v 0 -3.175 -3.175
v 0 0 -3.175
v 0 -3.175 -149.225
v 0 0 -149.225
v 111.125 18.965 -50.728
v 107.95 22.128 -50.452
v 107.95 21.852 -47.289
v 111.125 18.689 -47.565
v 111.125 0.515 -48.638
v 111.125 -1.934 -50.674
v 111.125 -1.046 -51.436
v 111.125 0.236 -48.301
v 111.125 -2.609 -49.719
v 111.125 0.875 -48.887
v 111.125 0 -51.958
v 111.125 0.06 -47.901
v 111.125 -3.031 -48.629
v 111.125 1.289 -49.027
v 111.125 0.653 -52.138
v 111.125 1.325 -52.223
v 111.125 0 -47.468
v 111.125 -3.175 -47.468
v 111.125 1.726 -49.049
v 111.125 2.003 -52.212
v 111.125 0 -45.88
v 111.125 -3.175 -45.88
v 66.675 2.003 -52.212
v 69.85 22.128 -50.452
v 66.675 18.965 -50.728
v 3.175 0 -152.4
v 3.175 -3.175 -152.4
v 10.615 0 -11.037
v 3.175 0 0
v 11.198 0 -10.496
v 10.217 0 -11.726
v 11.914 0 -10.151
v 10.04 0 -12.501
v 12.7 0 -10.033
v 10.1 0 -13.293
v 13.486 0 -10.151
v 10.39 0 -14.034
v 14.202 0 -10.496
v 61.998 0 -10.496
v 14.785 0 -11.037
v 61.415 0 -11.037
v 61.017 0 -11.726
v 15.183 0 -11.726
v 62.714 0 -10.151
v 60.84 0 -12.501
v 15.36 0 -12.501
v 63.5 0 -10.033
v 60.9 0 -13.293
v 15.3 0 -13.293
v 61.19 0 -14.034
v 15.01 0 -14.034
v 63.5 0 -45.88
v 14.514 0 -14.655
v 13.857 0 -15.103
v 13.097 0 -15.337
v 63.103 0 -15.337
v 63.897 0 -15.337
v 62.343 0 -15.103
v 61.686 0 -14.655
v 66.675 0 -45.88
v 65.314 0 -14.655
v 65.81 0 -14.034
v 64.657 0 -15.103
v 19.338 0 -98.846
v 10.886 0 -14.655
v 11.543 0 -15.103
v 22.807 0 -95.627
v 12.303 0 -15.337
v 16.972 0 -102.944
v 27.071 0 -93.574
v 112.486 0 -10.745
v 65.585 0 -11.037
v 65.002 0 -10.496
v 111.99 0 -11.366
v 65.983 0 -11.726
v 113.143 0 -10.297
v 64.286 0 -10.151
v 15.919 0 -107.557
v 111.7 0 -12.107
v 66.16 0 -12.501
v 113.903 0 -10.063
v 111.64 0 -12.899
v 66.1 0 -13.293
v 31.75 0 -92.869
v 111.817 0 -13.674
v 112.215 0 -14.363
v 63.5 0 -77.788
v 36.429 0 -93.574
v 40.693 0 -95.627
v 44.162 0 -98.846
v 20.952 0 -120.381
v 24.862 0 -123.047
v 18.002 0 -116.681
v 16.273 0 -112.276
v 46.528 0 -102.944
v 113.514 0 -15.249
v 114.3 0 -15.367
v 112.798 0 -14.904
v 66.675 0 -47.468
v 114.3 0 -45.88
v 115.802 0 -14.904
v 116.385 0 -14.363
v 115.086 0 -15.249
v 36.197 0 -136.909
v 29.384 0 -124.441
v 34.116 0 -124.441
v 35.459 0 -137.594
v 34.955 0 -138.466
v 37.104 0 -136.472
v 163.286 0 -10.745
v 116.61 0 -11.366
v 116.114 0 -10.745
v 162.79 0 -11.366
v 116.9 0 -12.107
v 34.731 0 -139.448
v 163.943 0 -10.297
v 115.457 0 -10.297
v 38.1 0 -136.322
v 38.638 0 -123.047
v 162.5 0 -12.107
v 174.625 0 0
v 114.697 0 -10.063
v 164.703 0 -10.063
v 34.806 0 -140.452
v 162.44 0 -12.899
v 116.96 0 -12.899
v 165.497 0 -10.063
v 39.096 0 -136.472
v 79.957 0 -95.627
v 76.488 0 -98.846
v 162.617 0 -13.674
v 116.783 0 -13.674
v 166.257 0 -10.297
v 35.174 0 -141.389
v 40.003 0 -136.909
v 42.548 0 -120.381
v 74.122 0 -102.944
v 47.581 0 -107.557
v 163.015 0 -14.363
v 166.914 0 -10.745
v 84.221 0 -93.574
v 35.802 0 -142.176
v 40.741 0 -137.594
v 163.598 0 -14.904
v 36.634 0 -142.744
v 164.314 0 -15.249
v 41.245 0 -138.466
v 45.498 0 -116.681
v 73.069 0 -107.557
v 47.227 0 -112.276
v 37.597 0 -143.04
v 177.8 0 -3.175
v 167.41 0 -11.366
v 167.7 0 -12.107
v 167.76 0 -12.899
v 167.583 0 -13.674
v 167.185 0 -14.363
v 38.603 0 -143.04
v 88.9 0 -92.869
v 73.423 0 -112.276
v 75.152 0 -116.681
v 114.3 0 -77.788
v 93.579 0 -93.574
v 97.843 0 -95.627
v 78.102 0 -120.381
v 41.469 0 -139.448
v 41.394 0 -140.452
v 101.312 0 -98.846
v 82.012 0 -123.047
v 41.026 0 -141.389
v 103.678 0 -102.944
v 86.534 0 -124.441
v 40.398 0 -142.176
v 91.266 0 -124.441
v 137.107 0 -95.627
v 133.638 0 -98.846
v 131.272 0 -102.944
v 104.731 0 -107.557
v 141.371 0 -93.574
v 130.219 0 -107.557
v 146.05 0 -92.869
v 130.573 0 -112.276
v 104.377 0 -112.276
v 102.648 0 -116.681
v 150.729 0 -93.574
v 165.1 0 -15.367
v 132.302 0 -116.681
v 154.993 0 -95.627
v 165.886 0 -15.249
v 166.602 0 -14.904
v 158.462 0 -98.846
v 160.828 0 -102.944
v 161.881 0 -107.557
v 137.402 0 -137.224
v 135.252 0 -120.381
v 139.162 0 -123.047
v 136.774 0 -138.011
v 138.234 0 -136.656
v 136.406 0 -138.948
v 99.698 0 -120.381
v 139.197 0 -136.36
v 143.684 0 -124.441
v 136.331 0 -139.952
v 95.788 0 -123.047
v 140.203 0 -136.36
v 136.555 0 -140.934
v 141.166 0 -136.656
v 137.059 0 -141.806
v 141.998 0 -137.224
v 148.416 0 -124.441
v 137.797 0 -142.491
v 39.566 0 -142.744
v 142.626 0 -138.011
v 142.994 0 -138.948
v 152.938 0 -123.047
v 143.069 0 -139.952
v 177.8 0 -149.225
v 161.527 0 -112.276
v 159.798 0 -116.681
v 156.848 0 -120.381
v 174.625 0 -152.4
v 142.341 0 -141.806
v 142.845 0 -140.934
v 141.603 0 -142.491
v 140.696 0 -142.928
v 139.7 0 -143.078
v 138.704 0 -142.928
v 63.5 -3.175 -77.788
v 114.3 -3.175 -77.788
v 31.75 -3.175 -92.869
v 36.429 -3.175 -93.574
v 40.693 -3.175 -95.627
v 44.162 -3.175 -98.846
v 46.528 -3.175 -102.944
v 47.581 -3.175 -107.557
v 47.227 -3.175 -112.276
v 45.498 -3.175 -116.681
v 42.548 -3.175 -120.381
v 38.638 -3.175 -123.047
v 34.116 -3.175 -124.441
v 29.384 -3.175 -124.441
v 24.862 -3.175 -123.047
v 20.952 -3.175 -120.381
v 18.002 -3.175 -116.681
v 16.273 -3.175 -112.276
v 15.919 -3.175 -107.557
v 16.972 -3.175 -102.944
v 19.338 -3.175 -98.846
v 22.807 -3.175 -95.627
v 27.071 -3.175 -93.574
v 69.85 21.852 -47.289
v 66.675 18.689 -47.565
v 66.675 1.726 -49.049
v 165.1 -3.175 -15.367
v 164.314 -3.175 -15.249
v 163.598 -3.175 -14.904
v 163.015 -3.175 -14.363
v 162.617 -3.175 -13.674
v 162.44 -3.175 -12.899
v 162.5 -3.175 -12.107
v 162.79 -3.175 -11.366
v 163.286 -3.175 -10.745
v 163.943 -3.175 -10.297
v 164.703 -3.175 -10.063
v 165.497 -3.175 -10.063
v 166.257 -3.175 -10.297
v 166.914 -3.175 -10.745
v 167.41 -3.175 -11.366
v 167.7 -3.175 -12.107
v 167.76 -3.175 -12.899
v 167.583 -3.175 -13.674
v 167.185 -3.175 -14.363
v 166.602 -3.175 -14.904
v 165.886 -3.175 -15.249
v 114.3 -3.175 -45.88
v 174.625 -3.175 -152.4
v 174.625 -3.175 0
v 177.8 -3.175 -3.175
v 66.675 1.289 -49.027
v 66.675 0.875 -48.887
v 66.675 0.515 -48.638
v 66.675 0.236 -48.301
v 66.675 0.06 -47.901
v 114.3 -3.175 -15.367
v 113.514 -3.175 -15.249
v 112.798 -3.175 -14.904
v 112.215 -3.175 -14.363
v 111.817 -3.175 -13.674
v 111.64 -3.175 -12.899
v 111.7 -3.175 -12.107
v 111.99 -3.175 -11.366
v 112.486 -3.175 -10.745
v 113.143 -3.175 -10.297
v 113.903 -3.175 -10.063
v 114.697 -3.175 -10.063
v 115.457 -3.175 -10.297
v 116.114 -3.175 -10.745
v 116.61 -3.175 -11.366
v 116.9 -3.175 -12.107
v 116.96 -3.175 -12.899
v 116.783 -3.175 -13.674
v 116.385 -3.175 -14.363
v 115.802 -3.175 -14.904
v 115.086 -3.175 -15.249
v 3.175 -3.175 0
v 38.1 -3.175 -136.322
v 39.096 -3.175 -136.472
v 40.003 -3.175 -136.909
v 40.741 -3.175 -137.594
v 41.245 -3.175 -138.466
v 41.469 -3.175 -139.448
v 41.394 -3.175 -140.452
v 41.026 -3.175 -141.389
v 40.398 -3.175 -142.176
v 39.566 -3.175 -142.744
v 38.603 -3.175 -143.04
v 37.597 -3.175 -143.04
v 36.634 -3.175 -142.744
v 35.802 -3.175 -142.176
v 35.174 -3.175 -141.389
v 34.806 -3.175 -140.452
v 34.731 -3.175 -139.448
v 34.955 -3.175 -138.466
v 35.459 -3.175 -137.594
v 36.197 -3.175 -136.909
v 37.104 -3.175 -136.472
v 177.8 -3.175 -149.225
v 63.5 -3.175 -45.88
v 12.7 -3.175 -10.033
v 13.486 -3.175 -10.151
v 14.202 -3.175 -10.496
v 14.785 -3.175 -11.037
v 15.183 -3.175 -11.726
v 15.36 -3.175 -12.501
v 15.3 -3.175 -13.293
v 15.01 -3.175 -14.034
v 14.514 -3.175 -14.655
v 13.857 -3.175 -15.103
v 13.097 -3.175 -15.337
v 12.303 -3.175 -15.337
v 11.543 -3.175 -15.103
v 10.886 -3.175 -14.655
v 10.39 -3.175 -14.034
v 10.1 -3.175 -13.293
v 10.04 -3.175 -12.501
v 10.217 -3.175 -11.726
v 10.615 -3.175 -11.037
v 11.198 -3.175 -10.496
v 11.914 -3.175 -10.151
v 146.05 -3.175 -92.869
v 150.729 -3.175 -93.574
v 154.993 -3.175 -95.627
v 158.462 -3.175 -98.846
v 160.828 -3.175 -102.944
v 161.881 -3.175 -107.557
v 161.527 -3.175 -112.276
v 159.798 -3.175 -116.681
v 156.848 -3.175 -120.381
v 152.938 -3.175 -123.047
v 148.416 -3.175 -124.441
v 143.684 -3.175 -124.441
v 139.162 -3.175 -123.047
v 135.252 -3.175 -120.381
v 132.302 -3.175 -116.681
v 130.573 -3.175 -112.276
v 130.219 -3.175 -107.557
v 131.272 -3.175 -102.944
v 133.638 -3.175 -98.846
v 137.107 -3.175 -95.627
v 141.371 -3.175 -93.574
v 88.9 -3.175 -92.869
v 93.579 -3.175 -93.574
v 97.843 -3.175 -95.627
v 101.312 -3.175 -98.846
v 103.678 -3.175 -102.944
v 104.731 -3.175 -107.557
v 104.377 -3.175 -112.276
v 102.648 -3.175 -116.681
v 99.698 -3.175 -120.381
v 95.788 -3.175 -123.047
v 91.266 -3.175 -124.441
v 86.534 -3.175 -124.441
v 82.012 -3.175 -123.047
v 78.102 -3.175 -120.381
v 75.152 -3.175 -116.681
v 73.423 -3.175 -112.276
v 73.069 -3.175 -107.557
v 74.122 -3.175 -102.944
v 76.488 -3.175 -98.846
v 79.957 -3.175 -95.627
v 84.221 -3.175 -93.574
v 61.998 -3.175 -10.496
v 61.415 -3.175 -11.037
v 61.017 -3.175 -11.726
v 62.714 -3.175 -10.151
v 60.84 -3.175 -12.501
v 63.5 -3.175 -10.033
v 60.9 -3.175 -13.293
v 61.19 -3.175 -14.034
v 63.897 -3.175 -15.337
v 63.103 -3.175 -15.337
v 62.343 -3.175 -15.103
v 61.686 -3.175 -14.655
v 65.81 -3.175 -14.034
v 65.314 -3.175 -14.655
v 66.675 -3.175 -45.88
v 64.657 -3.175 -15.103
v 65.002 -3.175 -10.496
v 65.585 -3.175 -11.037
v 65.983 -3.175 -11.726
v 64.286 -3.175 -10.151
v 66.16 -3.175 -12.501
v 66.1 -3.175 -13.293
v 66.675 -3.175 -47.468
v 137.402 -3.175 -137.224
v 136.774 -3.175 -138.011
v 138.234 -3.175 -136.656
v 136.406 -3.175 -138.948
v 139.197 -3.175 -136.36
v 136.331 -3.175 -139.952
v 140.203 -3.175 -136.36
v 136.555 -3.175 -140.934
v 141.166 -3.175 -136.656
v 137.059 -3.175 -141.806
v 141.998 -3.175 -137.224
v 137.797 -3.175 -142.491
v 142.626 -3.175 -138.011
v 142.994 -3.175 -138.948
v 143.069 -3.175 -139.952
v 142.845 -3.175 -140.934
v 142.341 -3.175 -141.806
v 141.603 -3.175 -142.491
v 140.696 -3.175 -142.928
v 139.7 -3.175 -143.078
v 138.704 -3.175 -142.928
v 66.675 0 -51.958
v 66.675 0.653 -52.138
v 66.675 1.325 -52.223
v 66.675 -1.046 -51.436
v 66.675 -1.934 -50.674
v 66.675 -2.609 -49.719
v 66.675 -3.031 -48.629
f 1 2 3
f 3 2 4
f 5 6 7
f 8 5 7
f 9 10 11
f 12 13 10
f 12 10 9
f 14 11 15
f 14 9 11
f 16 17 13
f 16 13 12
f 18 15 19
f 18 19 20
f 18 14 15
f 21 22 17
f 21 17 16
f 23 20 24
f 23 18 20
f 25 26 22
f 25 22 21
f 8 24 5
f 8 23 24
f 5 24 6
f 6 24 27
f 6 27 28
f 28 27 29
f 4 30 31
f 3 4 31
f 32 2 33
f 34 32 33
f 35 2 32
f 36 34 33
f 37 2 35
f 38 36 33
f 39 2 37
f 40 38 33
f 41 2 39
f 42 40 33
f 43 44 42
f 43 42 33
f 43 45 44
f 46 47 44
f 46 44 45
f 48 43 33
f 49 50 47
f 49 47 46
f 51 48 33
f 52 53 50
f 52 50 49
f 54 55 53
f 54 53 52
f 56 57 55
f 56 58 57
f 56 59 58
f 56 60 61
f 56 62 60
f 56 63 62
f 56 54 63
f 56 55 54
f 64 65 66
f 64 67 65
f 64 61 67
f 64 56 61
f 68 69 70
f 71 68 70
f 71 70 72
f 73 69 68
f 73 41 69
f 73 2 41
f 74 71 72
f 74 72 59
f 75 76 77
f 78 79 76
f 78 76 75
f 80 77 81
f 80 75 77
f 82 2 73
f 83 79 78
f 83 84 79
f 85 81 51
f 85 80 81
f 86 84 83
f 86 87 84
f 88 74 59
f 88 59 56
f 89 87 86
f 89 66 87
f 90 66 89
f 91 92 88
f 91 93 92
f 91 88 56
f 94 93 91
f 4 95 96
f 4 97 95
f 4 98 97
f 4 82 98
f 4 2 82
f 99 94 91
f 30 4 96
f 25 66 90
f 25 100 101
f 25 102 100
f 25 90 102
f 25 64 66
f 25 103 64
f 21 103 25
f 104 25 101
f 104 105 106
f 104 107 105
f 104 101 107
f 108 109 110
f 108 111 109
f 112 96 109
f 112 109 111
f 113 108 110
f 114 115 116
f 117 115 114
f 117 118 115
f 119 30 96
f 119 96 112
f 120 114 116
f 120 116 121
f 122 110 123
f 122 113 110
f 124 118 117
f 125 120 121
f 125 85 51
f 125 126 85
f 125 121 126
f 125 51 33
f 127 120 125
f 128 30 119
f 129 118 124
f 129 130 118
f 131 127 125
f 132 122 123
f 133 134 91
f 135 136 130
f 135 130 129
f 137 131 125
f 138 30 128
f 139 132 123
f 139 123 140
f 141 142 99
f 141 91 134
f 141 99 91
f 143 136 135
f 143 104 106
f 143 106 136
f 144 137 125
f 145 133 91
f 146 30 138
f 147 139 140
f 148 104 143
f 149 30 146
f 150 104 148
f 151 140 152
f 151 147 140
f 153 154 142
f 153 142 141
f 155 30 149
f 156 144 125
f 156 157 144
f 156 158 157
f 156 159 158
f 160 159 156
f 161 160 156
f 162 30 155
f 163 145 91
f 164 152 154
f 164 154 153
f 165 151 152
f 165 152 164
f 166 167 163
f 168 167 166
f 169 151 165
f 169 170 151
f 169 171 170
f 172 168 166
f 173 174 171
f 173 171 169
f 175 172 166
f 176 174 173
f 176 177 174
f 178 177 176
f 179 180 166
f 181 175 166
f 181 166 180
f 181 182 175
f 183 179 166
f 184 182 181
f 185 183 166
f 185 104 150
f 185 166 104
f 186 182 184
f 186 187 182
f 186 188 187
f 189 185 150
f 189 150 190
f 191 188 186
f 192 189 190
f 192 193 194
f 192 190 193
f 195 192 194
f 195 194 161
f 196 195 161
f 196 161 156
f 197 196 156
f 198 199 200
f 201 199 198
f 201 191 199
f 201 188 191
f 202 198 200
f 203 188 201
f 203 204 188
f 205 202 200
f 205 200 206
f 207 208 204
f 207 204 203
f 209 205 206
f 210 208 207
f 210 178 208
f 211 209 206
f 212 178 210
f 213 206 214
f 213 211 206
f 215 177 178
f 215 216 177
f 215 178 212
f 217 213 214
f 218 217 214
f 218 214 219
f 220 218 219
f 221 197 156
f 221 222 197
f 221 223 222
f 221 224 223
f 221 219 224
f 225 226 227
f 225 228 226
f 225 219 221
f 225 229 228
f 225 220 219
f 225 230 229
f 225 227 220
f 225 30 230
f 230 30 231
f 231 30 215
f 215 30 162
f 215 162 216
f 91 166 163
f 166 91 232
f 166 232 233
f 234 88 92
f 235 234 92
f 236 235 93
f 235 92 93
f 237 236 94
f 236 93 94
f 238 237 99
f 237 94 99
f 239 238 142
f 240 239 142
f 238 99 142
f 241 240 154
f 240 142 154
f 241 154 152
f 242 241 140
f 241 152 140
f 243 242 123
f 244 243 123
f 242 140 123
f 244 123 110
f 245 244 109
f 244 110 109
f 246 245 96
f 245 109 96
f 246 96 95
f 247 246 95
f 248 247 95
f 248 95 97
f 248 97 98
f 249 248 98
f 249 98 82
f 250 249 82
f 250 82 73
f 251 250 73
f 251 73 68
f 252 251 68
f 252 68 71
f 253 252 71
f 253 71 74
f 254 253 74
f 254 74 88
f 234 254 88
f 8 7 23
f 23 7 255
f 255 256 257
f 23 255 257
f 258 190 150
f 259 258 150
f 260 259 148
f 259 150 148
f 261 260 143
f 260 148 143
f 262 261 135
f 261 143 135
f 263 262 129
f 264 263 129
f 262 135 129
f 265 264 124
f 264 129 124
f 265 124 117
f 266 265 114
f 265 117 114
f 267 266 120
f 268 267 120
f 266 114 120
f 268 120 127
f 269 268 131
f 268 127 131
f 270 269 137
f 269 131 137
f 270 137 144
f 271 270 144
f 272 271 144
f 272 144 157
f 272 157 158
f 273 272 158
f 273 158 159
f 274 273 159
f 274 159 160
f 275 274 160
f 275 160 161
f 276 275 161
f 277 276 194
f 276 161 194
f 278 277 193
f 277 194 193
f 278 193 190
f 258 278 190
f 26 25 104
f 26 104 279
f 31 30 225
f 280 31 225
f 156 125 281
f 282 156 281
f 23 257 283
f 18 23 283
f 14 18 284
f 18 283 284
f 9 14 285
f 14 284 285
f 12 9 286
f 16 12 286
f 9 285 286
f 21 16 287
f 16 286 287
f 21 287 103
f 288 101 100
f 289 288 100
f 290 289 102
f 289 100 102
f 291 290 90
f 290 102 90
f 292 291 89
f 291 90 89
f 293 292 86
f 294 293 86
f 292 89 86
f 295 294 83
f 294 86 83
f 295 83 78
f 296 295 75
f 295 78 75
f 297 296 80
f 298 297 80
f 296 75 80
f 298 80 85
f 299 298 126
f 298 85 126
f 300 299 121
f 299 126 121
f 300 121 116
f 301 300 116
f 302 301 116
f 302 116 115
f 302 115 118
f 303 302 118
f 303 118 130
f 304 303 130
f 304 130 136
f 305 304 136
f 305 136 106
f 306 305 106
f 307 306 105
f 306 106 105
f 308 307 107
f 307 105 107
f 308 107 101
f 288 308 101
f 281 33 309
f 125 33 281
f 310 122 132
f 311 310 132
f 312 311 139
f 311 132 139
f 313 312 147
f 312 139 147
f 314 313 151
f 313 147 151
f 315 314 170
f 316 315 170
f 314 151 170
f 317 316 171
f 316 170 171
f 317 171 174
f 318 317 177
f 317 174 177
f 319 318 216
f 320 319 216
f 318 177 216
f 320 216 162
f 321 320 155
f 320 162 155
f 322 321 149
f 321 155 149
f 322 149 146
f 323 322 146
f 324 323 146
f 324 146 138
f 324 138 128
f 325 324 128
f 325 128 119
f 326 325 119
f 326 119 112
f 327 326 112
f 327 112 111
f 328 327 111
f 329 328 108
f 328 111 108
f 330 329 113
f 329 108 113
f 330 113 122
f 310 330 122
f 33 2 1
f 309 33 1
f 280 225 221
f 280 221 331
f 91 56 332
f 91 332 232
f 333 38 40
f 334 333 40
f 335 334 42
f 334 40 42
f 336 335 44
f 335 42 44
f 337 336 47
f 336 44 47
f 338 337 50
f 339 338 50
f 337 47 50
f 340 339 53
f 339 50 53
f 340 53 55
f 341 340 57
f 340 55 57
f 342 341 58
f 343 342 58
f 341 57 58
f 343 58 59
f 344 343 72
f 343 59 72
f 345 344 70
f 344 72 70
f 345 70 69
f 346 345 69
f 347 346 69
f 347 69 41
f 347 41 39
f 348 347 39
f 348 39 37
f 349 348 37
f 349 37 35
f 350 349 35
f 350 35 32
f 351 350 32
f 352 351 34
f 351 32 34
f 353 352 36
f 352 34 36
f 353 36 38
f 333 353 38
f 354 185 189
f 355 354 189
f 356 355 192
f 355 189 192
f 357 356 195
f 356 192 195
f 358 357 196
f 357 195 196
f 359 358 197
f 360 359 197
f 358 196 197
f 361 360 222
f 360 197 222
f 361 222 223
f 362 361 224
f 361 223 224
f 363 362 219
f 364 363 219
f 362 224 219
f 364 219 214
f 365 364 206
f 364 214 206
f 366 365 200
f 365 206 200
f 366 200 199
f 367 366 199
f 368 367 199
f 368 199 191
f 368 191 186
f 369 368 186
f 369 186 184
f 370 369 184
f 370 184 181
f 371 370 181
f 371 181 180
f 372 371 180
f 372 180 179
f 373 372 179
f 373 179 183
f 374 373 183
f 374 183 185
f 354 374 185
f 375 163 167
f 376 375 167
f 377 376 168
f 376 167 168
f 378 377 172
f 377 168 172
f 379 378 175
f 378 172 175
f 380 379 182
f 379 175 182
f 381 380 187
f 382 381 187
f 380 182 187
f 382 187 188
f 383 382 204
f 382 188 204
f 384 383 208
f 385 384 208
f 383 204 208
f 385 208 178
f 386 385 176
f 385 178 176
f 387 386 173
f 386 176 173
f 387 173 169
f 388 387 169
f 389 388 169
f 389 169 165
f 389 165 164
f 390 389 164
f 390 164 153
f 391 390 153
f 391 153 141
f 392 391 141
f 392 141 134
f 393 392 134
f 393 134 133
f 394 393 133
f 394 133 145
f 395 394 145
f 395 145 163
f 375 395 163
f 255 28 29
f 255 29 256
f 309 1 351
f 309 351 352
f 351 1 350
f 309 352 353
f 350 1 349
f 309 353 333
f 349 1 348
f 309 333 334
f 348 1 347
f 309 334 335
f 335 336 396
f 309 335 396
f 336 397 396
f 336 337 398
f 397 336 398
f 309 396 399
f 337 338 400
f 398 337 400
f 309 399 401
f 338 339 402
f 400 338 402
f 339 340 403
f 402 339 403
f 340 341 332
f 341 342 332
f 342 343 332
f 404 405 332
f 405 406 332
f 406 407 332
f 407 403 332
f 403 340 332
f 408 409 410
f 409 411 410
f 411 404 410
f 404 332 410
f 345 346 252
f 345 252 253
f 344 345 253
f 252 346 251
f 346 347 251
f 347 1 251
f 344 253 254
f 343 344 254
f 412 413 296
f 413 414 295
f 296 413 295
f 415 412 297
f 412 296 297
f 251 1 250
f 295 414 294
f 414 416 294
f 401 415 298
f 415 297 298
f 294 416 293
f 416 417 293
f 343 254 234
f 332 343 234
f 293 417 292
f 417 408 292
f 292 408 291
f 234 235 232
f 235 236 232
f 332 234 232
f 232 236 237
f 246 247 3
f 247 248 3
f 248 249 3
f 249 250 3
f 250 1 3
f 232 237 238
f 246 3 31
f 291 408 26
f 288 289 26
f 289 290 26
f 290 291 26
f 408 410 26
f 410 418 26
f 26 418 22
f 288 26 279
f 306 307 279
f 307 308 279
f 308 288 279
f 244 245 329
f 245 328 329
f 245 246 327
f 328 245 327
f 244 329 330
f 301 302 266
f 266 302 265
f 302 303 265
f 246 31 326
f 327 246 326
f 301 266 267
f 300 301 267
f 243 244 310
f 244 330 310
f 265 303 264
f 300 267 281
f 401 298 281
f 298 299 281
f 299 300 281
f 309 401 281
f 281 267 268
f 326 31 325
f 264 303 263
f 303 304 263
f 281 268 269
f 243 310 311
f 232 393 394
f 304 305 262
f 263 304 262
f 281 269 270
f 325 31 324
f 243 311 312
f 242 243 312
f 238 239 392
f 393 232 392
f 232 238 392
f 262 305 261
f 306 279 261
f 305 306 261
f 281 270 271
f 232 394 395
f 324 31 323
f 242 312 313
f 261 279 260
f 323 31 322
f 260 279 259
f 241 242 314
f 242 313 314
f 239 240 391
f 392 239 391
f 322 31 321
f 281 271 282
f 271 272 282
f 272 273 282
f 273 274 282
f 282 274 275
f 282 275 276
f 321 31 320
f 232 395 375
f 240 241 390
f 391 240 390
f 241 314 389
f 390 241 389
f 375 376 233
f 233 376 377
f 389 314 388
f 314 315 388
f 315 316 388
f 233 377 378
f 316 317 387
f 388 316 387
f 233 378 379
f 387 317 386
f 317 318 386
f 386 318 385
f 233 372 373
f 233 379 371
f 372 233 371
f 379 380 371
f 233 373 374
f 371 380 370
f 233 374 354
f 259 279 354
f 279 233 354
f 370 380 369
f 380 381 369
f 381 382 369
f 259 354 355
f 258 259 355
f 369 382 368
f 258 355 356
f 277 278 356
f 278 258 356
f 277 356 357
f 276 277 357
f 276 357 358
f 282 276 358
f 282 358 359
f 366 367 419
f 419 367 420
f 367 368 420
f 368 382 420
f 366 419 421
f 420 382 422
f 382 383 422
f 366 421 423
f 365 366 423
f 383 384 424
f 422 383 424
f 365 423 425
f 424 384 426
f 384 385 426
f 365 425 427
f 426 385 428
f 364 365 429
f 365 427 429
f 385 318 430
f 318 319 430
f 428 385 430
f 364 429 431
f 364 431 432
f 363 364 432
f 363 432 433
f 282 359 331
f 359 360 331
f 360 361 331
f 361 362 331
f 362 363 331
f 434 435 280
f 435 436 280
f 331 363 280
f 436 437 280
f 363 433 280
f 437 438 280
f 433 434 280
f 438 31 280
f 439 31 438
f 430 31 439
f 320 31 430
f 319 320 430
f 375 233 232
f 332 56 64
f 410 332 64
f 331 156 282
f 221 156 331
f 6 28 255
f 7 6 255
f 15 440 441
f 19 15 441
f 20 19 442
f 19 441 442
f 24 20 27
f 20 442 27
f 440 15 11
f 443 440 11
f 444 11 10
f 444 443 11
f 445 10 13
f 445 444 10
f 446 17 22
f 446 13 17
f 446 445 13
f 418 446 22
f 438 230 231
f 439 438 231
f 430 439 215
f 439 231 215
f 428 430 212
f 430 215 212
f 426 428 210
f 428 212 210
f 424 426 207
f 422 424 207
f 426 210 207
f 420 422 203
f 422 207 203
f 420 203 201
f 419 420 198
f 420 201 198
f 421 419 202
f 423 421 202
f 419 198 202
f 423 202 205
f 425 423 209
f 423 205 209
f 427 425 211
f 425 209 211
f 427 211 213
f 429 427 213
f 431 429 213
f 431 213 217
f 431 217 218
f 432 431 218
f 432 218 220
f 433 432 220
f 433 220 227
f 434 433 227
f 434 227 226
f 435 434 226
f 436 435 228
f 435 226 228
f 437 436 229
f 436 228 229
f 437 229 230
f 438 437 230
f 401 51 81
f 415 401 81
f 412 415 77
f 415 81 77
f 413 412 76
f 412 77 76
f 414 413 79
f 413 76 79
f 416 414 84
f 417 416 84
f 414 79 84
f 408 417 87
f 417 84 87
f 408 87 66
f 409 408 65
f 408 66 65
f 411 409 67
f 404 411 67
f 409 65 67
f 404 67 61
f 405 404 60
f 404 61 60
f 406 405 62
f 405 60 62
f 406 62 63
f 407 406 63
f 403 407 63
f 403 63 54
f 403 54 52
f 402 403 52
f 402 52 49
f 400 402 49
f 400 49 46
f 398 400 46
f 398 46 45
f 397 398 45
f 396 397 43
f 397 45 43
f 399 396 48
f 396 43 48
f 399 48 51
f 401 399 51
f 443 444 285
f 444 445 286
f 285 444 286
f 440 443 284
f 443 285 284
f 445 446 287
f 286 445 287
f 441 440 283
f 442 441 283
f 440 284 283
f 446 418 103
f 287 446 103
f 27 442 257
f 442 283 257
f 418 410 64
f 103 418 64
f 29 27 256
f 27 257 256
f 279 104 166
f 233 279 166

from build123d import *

# Parameters (mm, degrees)
SKETCH1_W            = 177.8
SKETCH1_H            = 152.4
SKETCH1_R            = 3.3782
SKETCH1_R_2          = 2.667
BASE_FLANGE1_DEPTH   = 3.175
CHAMFER2_SIZE        = 3.175
SKETCH7_W            = 50.8
SKETCH7_H            = 25.4
CUT_EXTRUDE2_DEPTH   = 235.197951795
EDGE_FLANGE1_START   = 65.0875
EDGE_FLANGE1_DEPTH   = 47.625
EDGE_FLANGE1_2_DEPTH = 1.5875
EDGE_FLANGE1_START_2 = 111.125
EDGE_FLANGE1_3_DEPTH = 1.5875
EDGE_FLANGE1_START_3 = 66.675
EDGE_FLANGE1_4_DEPTH = 44.45
SKETCH11_W           = 1.5875
SKETCH11_H           = 6.50708023
CUT_EXTRUDE3_DEPTH   = 236.219607319
CHAMFER3_SIZE        = 3.175
SKETCH12_R           = 15.875
CUT_EXTRUDE4_DEPTH   = 236.219607319


# Read off the part's stored shape, not the designer's step: Edge-Flange1
# Sheet-metal steps are written as plain solids
with BuildPart() as part:
    # Sketch1 → Base-Flange1 (new body)
    with BuildSketch(Plane(origin=(0, 0, 0), x_dir=(1, 0, 0), z_dir=(0, 1, 0))):
        with Locations((88.9, 76.2)):
            Rectangle(SKETCH1_W, SKETCH1_H)
        with Locations(Location((38.1, 139.7, 0), (0, 0, 270))):
            Circle(SKETCH1_R, mode=Mode.SUBTRACT)
        with Locations(Location((139.7, 139.7, 0), (0, 0, 90))):
            Circle(SKETCH1_R, mode=Mode.SUBTRACT)
        with Locations(Location((12.7, 12.7, 0), (0, 0, 270))):
            Circle(SKETCH1_R_2, mode=Mode.SUBTRACT)
        with Locations(Location((165.1, 12.7, 0), (0, 0, 90))):
            Circle(SKETCH1_R_2, mode=Mode.SUBTRACT)
        with Locations(Location((63.5, 12.7, 0), (0, 0, 270))):
            Circle(SKETCH1_R_2, mode=Mode.SUBTRACT)
        with Locations(Location((114.3, 12.7, 0), (0, 0, 90))):
            Circle(SKETCH1_R_2, mode=Mode.SUBTRACT)
    extrude(amount=-BASE_FLANGE1_DEPTH)

    # Chamfer2
    chamfer2_edges = [part.edges().sort_by_distance(p)[0] for p in [
        (0, -1.5875, -152.4),
        (177.8, -1.5875, -152.4),
        (177.8, -1.5875, 0),
        (0, -1.5875, 0),
    ]]
    chamfer(chamfer2_edges, length=CHAMFER2_SIZE)

    # Sketch7 → Cut-Extrude2 (cut, through all)
    with BuildSketch(Plane(origin=(0, 0, 0), x_dir=(1, 0, 0), z_dir=(0, 1, 0))):
        with Locations((88.9, 65.0875)):
            Rectangle(SKETCH7_W, SKETCH7_H)
    extrude(amount=-CUT_EXTRUDE2_DEPTH, mode=Mode.SUBTRACT)

    # Edge-Flange1 outline → Edge-Flange1 (cut)
    with BuildSketch(Plane.YZ.offset(EDGE_FLANGE1_START)):
        with BuildLine():
            ThreePointArc((0, -51.958047831), (-2.301064967, -50.217550427), (-3.175, -47.46791977))
            Line((-3.175, -47.46791977), (-3.175, -52.3875))
            Line((-3.175, -52.3875), (0, -52.3875))
            Line((0, -52.3875), (0, -51.958047831))
        make_face()
    extrude(amount=EDGE_FLANGE1_DEPTH, mode=Mode.SUBTRACT)

    # Edge-Flange1 2 outline → Edge-Flange1 2 (cut)
    with BuildSketch(Plane.YZ.offset(EDGE_FLANGE1_START)):
        with BuildLine():
            Line((0, -45.88041977), (-3.175, -45.88041977))
            Line((-3.175, -45.88041977), (-3.175, -47.46791977))
            ThreePointArc((-3.175, -47.46791977), (-2.301064967, -50.217550427), (0, -51.958047831))
            Line((0, -51.958047831), (0, -45.88041977))
        make_face()
    extrude(amount=EDGE_FLANGE1_2_DEPTH, mode=Mode.SUBTRACT)

    # Edge-Flange1 3 outline → Edge-Flange1 3 (cut)
    with BuildSketch(Plane.YZ.offset(EDGE_FLANGE1_START_2)):
        with BuildLine():
            Line((0, -45.88041977), (-3.175, -45.88041977))
            Line((-3.175, -45.88041977), (-3.175, -47.46791977))
            ThreePointArc((-3.175, -47.46791977), (-2.301064967, -50.217550427), (0, -51.958047831))
            Line((0, -51.958047831), (0, -45.88041977))
        make_face()
    extrude(amount=EDGE_FLANGE1_3_DEPTH, mode=Mode.SUBTRACT)

    # Edge-Flange1 4 outline → Edge-Flange1 4 (add)
    with BuildSketch(Plane.YZ.offset(EDGE_FLANGE1_START_3)):
        with BuildLine():
            ThreePointArc((1.725859742, -49.049378854), (0.515000545, -48.638347543), (0, -47.46791977))
            Line((0, -47.46791977), (0, -51.958047831))
            ThreePointArc((0, -51.958047831), (0.987663955, -52.19249414), (2.002579225, -52.21229702))
            Line((2.002579225, -52.21229702), (22.128345332, -50.451520641))
            Line((22.128345332, -50.451520641), (21.851625848, -47.288602474))
            Line((21.851625848, -47.288602474), (1.725859742, -49.049378854))
        make_face()
    extrude(amount=EDGE_FLANGE1_4_DEPTH)

    # Sketch11 → Cut-Extrude3 (cut, through all)
    with BuildSketch(Plane(origin=(0, 0, 0), x_dir=(1, 0, 0), z_dir=(0, 1, 0))):
        with Locations((64.29375, 49.133959885)):
            Rectangle(SKETCH11_W, SKETCH11_H)
        with Locations((113.50625, 49.133959885)):
            Rectangle(SKETCH11_W, SKETCH11_H)
    extrude(amount=-CUT_EXTRUDE3_DEPTH, mode=Mode.SUBTRACT)

    # Chamfer3
    chamfer3_edges = [part.edges().sort_by_distance(p)[0] for p in [
        (111.125, 21.98998559, -48.870061558),
        (66.675, 21.98998559, -48.870061558),
    ]]
    chamfer(chamfer3_edges, length=CHAMFER3_SIZE)

    # Sketch12 → Cut-Extrude4 (cut, through all)
    with BuildSketch(Plane(origin=(0, 0, 0), x_dir=(1, 0, 0), z_dir=(0, 1, 0))):
        with Locations(Location((88.9, 108.74375, 0), (0, 0, 270))):
            Circle(SKETCH12_R)
        with Locations(Location((146.05, 108.74375, 0), (0, 0, 270))):
            Circle(SKETCH12_R)
        with Locations(Location((31.75, 108.74375, 0), (0, 0, 270))):
            Circle(SKETCH12_R)
    extrude(amount=-CUT_EXTRUDE4_DEPTH, mode=Mode.SUBTRACT)


solid = part.part
